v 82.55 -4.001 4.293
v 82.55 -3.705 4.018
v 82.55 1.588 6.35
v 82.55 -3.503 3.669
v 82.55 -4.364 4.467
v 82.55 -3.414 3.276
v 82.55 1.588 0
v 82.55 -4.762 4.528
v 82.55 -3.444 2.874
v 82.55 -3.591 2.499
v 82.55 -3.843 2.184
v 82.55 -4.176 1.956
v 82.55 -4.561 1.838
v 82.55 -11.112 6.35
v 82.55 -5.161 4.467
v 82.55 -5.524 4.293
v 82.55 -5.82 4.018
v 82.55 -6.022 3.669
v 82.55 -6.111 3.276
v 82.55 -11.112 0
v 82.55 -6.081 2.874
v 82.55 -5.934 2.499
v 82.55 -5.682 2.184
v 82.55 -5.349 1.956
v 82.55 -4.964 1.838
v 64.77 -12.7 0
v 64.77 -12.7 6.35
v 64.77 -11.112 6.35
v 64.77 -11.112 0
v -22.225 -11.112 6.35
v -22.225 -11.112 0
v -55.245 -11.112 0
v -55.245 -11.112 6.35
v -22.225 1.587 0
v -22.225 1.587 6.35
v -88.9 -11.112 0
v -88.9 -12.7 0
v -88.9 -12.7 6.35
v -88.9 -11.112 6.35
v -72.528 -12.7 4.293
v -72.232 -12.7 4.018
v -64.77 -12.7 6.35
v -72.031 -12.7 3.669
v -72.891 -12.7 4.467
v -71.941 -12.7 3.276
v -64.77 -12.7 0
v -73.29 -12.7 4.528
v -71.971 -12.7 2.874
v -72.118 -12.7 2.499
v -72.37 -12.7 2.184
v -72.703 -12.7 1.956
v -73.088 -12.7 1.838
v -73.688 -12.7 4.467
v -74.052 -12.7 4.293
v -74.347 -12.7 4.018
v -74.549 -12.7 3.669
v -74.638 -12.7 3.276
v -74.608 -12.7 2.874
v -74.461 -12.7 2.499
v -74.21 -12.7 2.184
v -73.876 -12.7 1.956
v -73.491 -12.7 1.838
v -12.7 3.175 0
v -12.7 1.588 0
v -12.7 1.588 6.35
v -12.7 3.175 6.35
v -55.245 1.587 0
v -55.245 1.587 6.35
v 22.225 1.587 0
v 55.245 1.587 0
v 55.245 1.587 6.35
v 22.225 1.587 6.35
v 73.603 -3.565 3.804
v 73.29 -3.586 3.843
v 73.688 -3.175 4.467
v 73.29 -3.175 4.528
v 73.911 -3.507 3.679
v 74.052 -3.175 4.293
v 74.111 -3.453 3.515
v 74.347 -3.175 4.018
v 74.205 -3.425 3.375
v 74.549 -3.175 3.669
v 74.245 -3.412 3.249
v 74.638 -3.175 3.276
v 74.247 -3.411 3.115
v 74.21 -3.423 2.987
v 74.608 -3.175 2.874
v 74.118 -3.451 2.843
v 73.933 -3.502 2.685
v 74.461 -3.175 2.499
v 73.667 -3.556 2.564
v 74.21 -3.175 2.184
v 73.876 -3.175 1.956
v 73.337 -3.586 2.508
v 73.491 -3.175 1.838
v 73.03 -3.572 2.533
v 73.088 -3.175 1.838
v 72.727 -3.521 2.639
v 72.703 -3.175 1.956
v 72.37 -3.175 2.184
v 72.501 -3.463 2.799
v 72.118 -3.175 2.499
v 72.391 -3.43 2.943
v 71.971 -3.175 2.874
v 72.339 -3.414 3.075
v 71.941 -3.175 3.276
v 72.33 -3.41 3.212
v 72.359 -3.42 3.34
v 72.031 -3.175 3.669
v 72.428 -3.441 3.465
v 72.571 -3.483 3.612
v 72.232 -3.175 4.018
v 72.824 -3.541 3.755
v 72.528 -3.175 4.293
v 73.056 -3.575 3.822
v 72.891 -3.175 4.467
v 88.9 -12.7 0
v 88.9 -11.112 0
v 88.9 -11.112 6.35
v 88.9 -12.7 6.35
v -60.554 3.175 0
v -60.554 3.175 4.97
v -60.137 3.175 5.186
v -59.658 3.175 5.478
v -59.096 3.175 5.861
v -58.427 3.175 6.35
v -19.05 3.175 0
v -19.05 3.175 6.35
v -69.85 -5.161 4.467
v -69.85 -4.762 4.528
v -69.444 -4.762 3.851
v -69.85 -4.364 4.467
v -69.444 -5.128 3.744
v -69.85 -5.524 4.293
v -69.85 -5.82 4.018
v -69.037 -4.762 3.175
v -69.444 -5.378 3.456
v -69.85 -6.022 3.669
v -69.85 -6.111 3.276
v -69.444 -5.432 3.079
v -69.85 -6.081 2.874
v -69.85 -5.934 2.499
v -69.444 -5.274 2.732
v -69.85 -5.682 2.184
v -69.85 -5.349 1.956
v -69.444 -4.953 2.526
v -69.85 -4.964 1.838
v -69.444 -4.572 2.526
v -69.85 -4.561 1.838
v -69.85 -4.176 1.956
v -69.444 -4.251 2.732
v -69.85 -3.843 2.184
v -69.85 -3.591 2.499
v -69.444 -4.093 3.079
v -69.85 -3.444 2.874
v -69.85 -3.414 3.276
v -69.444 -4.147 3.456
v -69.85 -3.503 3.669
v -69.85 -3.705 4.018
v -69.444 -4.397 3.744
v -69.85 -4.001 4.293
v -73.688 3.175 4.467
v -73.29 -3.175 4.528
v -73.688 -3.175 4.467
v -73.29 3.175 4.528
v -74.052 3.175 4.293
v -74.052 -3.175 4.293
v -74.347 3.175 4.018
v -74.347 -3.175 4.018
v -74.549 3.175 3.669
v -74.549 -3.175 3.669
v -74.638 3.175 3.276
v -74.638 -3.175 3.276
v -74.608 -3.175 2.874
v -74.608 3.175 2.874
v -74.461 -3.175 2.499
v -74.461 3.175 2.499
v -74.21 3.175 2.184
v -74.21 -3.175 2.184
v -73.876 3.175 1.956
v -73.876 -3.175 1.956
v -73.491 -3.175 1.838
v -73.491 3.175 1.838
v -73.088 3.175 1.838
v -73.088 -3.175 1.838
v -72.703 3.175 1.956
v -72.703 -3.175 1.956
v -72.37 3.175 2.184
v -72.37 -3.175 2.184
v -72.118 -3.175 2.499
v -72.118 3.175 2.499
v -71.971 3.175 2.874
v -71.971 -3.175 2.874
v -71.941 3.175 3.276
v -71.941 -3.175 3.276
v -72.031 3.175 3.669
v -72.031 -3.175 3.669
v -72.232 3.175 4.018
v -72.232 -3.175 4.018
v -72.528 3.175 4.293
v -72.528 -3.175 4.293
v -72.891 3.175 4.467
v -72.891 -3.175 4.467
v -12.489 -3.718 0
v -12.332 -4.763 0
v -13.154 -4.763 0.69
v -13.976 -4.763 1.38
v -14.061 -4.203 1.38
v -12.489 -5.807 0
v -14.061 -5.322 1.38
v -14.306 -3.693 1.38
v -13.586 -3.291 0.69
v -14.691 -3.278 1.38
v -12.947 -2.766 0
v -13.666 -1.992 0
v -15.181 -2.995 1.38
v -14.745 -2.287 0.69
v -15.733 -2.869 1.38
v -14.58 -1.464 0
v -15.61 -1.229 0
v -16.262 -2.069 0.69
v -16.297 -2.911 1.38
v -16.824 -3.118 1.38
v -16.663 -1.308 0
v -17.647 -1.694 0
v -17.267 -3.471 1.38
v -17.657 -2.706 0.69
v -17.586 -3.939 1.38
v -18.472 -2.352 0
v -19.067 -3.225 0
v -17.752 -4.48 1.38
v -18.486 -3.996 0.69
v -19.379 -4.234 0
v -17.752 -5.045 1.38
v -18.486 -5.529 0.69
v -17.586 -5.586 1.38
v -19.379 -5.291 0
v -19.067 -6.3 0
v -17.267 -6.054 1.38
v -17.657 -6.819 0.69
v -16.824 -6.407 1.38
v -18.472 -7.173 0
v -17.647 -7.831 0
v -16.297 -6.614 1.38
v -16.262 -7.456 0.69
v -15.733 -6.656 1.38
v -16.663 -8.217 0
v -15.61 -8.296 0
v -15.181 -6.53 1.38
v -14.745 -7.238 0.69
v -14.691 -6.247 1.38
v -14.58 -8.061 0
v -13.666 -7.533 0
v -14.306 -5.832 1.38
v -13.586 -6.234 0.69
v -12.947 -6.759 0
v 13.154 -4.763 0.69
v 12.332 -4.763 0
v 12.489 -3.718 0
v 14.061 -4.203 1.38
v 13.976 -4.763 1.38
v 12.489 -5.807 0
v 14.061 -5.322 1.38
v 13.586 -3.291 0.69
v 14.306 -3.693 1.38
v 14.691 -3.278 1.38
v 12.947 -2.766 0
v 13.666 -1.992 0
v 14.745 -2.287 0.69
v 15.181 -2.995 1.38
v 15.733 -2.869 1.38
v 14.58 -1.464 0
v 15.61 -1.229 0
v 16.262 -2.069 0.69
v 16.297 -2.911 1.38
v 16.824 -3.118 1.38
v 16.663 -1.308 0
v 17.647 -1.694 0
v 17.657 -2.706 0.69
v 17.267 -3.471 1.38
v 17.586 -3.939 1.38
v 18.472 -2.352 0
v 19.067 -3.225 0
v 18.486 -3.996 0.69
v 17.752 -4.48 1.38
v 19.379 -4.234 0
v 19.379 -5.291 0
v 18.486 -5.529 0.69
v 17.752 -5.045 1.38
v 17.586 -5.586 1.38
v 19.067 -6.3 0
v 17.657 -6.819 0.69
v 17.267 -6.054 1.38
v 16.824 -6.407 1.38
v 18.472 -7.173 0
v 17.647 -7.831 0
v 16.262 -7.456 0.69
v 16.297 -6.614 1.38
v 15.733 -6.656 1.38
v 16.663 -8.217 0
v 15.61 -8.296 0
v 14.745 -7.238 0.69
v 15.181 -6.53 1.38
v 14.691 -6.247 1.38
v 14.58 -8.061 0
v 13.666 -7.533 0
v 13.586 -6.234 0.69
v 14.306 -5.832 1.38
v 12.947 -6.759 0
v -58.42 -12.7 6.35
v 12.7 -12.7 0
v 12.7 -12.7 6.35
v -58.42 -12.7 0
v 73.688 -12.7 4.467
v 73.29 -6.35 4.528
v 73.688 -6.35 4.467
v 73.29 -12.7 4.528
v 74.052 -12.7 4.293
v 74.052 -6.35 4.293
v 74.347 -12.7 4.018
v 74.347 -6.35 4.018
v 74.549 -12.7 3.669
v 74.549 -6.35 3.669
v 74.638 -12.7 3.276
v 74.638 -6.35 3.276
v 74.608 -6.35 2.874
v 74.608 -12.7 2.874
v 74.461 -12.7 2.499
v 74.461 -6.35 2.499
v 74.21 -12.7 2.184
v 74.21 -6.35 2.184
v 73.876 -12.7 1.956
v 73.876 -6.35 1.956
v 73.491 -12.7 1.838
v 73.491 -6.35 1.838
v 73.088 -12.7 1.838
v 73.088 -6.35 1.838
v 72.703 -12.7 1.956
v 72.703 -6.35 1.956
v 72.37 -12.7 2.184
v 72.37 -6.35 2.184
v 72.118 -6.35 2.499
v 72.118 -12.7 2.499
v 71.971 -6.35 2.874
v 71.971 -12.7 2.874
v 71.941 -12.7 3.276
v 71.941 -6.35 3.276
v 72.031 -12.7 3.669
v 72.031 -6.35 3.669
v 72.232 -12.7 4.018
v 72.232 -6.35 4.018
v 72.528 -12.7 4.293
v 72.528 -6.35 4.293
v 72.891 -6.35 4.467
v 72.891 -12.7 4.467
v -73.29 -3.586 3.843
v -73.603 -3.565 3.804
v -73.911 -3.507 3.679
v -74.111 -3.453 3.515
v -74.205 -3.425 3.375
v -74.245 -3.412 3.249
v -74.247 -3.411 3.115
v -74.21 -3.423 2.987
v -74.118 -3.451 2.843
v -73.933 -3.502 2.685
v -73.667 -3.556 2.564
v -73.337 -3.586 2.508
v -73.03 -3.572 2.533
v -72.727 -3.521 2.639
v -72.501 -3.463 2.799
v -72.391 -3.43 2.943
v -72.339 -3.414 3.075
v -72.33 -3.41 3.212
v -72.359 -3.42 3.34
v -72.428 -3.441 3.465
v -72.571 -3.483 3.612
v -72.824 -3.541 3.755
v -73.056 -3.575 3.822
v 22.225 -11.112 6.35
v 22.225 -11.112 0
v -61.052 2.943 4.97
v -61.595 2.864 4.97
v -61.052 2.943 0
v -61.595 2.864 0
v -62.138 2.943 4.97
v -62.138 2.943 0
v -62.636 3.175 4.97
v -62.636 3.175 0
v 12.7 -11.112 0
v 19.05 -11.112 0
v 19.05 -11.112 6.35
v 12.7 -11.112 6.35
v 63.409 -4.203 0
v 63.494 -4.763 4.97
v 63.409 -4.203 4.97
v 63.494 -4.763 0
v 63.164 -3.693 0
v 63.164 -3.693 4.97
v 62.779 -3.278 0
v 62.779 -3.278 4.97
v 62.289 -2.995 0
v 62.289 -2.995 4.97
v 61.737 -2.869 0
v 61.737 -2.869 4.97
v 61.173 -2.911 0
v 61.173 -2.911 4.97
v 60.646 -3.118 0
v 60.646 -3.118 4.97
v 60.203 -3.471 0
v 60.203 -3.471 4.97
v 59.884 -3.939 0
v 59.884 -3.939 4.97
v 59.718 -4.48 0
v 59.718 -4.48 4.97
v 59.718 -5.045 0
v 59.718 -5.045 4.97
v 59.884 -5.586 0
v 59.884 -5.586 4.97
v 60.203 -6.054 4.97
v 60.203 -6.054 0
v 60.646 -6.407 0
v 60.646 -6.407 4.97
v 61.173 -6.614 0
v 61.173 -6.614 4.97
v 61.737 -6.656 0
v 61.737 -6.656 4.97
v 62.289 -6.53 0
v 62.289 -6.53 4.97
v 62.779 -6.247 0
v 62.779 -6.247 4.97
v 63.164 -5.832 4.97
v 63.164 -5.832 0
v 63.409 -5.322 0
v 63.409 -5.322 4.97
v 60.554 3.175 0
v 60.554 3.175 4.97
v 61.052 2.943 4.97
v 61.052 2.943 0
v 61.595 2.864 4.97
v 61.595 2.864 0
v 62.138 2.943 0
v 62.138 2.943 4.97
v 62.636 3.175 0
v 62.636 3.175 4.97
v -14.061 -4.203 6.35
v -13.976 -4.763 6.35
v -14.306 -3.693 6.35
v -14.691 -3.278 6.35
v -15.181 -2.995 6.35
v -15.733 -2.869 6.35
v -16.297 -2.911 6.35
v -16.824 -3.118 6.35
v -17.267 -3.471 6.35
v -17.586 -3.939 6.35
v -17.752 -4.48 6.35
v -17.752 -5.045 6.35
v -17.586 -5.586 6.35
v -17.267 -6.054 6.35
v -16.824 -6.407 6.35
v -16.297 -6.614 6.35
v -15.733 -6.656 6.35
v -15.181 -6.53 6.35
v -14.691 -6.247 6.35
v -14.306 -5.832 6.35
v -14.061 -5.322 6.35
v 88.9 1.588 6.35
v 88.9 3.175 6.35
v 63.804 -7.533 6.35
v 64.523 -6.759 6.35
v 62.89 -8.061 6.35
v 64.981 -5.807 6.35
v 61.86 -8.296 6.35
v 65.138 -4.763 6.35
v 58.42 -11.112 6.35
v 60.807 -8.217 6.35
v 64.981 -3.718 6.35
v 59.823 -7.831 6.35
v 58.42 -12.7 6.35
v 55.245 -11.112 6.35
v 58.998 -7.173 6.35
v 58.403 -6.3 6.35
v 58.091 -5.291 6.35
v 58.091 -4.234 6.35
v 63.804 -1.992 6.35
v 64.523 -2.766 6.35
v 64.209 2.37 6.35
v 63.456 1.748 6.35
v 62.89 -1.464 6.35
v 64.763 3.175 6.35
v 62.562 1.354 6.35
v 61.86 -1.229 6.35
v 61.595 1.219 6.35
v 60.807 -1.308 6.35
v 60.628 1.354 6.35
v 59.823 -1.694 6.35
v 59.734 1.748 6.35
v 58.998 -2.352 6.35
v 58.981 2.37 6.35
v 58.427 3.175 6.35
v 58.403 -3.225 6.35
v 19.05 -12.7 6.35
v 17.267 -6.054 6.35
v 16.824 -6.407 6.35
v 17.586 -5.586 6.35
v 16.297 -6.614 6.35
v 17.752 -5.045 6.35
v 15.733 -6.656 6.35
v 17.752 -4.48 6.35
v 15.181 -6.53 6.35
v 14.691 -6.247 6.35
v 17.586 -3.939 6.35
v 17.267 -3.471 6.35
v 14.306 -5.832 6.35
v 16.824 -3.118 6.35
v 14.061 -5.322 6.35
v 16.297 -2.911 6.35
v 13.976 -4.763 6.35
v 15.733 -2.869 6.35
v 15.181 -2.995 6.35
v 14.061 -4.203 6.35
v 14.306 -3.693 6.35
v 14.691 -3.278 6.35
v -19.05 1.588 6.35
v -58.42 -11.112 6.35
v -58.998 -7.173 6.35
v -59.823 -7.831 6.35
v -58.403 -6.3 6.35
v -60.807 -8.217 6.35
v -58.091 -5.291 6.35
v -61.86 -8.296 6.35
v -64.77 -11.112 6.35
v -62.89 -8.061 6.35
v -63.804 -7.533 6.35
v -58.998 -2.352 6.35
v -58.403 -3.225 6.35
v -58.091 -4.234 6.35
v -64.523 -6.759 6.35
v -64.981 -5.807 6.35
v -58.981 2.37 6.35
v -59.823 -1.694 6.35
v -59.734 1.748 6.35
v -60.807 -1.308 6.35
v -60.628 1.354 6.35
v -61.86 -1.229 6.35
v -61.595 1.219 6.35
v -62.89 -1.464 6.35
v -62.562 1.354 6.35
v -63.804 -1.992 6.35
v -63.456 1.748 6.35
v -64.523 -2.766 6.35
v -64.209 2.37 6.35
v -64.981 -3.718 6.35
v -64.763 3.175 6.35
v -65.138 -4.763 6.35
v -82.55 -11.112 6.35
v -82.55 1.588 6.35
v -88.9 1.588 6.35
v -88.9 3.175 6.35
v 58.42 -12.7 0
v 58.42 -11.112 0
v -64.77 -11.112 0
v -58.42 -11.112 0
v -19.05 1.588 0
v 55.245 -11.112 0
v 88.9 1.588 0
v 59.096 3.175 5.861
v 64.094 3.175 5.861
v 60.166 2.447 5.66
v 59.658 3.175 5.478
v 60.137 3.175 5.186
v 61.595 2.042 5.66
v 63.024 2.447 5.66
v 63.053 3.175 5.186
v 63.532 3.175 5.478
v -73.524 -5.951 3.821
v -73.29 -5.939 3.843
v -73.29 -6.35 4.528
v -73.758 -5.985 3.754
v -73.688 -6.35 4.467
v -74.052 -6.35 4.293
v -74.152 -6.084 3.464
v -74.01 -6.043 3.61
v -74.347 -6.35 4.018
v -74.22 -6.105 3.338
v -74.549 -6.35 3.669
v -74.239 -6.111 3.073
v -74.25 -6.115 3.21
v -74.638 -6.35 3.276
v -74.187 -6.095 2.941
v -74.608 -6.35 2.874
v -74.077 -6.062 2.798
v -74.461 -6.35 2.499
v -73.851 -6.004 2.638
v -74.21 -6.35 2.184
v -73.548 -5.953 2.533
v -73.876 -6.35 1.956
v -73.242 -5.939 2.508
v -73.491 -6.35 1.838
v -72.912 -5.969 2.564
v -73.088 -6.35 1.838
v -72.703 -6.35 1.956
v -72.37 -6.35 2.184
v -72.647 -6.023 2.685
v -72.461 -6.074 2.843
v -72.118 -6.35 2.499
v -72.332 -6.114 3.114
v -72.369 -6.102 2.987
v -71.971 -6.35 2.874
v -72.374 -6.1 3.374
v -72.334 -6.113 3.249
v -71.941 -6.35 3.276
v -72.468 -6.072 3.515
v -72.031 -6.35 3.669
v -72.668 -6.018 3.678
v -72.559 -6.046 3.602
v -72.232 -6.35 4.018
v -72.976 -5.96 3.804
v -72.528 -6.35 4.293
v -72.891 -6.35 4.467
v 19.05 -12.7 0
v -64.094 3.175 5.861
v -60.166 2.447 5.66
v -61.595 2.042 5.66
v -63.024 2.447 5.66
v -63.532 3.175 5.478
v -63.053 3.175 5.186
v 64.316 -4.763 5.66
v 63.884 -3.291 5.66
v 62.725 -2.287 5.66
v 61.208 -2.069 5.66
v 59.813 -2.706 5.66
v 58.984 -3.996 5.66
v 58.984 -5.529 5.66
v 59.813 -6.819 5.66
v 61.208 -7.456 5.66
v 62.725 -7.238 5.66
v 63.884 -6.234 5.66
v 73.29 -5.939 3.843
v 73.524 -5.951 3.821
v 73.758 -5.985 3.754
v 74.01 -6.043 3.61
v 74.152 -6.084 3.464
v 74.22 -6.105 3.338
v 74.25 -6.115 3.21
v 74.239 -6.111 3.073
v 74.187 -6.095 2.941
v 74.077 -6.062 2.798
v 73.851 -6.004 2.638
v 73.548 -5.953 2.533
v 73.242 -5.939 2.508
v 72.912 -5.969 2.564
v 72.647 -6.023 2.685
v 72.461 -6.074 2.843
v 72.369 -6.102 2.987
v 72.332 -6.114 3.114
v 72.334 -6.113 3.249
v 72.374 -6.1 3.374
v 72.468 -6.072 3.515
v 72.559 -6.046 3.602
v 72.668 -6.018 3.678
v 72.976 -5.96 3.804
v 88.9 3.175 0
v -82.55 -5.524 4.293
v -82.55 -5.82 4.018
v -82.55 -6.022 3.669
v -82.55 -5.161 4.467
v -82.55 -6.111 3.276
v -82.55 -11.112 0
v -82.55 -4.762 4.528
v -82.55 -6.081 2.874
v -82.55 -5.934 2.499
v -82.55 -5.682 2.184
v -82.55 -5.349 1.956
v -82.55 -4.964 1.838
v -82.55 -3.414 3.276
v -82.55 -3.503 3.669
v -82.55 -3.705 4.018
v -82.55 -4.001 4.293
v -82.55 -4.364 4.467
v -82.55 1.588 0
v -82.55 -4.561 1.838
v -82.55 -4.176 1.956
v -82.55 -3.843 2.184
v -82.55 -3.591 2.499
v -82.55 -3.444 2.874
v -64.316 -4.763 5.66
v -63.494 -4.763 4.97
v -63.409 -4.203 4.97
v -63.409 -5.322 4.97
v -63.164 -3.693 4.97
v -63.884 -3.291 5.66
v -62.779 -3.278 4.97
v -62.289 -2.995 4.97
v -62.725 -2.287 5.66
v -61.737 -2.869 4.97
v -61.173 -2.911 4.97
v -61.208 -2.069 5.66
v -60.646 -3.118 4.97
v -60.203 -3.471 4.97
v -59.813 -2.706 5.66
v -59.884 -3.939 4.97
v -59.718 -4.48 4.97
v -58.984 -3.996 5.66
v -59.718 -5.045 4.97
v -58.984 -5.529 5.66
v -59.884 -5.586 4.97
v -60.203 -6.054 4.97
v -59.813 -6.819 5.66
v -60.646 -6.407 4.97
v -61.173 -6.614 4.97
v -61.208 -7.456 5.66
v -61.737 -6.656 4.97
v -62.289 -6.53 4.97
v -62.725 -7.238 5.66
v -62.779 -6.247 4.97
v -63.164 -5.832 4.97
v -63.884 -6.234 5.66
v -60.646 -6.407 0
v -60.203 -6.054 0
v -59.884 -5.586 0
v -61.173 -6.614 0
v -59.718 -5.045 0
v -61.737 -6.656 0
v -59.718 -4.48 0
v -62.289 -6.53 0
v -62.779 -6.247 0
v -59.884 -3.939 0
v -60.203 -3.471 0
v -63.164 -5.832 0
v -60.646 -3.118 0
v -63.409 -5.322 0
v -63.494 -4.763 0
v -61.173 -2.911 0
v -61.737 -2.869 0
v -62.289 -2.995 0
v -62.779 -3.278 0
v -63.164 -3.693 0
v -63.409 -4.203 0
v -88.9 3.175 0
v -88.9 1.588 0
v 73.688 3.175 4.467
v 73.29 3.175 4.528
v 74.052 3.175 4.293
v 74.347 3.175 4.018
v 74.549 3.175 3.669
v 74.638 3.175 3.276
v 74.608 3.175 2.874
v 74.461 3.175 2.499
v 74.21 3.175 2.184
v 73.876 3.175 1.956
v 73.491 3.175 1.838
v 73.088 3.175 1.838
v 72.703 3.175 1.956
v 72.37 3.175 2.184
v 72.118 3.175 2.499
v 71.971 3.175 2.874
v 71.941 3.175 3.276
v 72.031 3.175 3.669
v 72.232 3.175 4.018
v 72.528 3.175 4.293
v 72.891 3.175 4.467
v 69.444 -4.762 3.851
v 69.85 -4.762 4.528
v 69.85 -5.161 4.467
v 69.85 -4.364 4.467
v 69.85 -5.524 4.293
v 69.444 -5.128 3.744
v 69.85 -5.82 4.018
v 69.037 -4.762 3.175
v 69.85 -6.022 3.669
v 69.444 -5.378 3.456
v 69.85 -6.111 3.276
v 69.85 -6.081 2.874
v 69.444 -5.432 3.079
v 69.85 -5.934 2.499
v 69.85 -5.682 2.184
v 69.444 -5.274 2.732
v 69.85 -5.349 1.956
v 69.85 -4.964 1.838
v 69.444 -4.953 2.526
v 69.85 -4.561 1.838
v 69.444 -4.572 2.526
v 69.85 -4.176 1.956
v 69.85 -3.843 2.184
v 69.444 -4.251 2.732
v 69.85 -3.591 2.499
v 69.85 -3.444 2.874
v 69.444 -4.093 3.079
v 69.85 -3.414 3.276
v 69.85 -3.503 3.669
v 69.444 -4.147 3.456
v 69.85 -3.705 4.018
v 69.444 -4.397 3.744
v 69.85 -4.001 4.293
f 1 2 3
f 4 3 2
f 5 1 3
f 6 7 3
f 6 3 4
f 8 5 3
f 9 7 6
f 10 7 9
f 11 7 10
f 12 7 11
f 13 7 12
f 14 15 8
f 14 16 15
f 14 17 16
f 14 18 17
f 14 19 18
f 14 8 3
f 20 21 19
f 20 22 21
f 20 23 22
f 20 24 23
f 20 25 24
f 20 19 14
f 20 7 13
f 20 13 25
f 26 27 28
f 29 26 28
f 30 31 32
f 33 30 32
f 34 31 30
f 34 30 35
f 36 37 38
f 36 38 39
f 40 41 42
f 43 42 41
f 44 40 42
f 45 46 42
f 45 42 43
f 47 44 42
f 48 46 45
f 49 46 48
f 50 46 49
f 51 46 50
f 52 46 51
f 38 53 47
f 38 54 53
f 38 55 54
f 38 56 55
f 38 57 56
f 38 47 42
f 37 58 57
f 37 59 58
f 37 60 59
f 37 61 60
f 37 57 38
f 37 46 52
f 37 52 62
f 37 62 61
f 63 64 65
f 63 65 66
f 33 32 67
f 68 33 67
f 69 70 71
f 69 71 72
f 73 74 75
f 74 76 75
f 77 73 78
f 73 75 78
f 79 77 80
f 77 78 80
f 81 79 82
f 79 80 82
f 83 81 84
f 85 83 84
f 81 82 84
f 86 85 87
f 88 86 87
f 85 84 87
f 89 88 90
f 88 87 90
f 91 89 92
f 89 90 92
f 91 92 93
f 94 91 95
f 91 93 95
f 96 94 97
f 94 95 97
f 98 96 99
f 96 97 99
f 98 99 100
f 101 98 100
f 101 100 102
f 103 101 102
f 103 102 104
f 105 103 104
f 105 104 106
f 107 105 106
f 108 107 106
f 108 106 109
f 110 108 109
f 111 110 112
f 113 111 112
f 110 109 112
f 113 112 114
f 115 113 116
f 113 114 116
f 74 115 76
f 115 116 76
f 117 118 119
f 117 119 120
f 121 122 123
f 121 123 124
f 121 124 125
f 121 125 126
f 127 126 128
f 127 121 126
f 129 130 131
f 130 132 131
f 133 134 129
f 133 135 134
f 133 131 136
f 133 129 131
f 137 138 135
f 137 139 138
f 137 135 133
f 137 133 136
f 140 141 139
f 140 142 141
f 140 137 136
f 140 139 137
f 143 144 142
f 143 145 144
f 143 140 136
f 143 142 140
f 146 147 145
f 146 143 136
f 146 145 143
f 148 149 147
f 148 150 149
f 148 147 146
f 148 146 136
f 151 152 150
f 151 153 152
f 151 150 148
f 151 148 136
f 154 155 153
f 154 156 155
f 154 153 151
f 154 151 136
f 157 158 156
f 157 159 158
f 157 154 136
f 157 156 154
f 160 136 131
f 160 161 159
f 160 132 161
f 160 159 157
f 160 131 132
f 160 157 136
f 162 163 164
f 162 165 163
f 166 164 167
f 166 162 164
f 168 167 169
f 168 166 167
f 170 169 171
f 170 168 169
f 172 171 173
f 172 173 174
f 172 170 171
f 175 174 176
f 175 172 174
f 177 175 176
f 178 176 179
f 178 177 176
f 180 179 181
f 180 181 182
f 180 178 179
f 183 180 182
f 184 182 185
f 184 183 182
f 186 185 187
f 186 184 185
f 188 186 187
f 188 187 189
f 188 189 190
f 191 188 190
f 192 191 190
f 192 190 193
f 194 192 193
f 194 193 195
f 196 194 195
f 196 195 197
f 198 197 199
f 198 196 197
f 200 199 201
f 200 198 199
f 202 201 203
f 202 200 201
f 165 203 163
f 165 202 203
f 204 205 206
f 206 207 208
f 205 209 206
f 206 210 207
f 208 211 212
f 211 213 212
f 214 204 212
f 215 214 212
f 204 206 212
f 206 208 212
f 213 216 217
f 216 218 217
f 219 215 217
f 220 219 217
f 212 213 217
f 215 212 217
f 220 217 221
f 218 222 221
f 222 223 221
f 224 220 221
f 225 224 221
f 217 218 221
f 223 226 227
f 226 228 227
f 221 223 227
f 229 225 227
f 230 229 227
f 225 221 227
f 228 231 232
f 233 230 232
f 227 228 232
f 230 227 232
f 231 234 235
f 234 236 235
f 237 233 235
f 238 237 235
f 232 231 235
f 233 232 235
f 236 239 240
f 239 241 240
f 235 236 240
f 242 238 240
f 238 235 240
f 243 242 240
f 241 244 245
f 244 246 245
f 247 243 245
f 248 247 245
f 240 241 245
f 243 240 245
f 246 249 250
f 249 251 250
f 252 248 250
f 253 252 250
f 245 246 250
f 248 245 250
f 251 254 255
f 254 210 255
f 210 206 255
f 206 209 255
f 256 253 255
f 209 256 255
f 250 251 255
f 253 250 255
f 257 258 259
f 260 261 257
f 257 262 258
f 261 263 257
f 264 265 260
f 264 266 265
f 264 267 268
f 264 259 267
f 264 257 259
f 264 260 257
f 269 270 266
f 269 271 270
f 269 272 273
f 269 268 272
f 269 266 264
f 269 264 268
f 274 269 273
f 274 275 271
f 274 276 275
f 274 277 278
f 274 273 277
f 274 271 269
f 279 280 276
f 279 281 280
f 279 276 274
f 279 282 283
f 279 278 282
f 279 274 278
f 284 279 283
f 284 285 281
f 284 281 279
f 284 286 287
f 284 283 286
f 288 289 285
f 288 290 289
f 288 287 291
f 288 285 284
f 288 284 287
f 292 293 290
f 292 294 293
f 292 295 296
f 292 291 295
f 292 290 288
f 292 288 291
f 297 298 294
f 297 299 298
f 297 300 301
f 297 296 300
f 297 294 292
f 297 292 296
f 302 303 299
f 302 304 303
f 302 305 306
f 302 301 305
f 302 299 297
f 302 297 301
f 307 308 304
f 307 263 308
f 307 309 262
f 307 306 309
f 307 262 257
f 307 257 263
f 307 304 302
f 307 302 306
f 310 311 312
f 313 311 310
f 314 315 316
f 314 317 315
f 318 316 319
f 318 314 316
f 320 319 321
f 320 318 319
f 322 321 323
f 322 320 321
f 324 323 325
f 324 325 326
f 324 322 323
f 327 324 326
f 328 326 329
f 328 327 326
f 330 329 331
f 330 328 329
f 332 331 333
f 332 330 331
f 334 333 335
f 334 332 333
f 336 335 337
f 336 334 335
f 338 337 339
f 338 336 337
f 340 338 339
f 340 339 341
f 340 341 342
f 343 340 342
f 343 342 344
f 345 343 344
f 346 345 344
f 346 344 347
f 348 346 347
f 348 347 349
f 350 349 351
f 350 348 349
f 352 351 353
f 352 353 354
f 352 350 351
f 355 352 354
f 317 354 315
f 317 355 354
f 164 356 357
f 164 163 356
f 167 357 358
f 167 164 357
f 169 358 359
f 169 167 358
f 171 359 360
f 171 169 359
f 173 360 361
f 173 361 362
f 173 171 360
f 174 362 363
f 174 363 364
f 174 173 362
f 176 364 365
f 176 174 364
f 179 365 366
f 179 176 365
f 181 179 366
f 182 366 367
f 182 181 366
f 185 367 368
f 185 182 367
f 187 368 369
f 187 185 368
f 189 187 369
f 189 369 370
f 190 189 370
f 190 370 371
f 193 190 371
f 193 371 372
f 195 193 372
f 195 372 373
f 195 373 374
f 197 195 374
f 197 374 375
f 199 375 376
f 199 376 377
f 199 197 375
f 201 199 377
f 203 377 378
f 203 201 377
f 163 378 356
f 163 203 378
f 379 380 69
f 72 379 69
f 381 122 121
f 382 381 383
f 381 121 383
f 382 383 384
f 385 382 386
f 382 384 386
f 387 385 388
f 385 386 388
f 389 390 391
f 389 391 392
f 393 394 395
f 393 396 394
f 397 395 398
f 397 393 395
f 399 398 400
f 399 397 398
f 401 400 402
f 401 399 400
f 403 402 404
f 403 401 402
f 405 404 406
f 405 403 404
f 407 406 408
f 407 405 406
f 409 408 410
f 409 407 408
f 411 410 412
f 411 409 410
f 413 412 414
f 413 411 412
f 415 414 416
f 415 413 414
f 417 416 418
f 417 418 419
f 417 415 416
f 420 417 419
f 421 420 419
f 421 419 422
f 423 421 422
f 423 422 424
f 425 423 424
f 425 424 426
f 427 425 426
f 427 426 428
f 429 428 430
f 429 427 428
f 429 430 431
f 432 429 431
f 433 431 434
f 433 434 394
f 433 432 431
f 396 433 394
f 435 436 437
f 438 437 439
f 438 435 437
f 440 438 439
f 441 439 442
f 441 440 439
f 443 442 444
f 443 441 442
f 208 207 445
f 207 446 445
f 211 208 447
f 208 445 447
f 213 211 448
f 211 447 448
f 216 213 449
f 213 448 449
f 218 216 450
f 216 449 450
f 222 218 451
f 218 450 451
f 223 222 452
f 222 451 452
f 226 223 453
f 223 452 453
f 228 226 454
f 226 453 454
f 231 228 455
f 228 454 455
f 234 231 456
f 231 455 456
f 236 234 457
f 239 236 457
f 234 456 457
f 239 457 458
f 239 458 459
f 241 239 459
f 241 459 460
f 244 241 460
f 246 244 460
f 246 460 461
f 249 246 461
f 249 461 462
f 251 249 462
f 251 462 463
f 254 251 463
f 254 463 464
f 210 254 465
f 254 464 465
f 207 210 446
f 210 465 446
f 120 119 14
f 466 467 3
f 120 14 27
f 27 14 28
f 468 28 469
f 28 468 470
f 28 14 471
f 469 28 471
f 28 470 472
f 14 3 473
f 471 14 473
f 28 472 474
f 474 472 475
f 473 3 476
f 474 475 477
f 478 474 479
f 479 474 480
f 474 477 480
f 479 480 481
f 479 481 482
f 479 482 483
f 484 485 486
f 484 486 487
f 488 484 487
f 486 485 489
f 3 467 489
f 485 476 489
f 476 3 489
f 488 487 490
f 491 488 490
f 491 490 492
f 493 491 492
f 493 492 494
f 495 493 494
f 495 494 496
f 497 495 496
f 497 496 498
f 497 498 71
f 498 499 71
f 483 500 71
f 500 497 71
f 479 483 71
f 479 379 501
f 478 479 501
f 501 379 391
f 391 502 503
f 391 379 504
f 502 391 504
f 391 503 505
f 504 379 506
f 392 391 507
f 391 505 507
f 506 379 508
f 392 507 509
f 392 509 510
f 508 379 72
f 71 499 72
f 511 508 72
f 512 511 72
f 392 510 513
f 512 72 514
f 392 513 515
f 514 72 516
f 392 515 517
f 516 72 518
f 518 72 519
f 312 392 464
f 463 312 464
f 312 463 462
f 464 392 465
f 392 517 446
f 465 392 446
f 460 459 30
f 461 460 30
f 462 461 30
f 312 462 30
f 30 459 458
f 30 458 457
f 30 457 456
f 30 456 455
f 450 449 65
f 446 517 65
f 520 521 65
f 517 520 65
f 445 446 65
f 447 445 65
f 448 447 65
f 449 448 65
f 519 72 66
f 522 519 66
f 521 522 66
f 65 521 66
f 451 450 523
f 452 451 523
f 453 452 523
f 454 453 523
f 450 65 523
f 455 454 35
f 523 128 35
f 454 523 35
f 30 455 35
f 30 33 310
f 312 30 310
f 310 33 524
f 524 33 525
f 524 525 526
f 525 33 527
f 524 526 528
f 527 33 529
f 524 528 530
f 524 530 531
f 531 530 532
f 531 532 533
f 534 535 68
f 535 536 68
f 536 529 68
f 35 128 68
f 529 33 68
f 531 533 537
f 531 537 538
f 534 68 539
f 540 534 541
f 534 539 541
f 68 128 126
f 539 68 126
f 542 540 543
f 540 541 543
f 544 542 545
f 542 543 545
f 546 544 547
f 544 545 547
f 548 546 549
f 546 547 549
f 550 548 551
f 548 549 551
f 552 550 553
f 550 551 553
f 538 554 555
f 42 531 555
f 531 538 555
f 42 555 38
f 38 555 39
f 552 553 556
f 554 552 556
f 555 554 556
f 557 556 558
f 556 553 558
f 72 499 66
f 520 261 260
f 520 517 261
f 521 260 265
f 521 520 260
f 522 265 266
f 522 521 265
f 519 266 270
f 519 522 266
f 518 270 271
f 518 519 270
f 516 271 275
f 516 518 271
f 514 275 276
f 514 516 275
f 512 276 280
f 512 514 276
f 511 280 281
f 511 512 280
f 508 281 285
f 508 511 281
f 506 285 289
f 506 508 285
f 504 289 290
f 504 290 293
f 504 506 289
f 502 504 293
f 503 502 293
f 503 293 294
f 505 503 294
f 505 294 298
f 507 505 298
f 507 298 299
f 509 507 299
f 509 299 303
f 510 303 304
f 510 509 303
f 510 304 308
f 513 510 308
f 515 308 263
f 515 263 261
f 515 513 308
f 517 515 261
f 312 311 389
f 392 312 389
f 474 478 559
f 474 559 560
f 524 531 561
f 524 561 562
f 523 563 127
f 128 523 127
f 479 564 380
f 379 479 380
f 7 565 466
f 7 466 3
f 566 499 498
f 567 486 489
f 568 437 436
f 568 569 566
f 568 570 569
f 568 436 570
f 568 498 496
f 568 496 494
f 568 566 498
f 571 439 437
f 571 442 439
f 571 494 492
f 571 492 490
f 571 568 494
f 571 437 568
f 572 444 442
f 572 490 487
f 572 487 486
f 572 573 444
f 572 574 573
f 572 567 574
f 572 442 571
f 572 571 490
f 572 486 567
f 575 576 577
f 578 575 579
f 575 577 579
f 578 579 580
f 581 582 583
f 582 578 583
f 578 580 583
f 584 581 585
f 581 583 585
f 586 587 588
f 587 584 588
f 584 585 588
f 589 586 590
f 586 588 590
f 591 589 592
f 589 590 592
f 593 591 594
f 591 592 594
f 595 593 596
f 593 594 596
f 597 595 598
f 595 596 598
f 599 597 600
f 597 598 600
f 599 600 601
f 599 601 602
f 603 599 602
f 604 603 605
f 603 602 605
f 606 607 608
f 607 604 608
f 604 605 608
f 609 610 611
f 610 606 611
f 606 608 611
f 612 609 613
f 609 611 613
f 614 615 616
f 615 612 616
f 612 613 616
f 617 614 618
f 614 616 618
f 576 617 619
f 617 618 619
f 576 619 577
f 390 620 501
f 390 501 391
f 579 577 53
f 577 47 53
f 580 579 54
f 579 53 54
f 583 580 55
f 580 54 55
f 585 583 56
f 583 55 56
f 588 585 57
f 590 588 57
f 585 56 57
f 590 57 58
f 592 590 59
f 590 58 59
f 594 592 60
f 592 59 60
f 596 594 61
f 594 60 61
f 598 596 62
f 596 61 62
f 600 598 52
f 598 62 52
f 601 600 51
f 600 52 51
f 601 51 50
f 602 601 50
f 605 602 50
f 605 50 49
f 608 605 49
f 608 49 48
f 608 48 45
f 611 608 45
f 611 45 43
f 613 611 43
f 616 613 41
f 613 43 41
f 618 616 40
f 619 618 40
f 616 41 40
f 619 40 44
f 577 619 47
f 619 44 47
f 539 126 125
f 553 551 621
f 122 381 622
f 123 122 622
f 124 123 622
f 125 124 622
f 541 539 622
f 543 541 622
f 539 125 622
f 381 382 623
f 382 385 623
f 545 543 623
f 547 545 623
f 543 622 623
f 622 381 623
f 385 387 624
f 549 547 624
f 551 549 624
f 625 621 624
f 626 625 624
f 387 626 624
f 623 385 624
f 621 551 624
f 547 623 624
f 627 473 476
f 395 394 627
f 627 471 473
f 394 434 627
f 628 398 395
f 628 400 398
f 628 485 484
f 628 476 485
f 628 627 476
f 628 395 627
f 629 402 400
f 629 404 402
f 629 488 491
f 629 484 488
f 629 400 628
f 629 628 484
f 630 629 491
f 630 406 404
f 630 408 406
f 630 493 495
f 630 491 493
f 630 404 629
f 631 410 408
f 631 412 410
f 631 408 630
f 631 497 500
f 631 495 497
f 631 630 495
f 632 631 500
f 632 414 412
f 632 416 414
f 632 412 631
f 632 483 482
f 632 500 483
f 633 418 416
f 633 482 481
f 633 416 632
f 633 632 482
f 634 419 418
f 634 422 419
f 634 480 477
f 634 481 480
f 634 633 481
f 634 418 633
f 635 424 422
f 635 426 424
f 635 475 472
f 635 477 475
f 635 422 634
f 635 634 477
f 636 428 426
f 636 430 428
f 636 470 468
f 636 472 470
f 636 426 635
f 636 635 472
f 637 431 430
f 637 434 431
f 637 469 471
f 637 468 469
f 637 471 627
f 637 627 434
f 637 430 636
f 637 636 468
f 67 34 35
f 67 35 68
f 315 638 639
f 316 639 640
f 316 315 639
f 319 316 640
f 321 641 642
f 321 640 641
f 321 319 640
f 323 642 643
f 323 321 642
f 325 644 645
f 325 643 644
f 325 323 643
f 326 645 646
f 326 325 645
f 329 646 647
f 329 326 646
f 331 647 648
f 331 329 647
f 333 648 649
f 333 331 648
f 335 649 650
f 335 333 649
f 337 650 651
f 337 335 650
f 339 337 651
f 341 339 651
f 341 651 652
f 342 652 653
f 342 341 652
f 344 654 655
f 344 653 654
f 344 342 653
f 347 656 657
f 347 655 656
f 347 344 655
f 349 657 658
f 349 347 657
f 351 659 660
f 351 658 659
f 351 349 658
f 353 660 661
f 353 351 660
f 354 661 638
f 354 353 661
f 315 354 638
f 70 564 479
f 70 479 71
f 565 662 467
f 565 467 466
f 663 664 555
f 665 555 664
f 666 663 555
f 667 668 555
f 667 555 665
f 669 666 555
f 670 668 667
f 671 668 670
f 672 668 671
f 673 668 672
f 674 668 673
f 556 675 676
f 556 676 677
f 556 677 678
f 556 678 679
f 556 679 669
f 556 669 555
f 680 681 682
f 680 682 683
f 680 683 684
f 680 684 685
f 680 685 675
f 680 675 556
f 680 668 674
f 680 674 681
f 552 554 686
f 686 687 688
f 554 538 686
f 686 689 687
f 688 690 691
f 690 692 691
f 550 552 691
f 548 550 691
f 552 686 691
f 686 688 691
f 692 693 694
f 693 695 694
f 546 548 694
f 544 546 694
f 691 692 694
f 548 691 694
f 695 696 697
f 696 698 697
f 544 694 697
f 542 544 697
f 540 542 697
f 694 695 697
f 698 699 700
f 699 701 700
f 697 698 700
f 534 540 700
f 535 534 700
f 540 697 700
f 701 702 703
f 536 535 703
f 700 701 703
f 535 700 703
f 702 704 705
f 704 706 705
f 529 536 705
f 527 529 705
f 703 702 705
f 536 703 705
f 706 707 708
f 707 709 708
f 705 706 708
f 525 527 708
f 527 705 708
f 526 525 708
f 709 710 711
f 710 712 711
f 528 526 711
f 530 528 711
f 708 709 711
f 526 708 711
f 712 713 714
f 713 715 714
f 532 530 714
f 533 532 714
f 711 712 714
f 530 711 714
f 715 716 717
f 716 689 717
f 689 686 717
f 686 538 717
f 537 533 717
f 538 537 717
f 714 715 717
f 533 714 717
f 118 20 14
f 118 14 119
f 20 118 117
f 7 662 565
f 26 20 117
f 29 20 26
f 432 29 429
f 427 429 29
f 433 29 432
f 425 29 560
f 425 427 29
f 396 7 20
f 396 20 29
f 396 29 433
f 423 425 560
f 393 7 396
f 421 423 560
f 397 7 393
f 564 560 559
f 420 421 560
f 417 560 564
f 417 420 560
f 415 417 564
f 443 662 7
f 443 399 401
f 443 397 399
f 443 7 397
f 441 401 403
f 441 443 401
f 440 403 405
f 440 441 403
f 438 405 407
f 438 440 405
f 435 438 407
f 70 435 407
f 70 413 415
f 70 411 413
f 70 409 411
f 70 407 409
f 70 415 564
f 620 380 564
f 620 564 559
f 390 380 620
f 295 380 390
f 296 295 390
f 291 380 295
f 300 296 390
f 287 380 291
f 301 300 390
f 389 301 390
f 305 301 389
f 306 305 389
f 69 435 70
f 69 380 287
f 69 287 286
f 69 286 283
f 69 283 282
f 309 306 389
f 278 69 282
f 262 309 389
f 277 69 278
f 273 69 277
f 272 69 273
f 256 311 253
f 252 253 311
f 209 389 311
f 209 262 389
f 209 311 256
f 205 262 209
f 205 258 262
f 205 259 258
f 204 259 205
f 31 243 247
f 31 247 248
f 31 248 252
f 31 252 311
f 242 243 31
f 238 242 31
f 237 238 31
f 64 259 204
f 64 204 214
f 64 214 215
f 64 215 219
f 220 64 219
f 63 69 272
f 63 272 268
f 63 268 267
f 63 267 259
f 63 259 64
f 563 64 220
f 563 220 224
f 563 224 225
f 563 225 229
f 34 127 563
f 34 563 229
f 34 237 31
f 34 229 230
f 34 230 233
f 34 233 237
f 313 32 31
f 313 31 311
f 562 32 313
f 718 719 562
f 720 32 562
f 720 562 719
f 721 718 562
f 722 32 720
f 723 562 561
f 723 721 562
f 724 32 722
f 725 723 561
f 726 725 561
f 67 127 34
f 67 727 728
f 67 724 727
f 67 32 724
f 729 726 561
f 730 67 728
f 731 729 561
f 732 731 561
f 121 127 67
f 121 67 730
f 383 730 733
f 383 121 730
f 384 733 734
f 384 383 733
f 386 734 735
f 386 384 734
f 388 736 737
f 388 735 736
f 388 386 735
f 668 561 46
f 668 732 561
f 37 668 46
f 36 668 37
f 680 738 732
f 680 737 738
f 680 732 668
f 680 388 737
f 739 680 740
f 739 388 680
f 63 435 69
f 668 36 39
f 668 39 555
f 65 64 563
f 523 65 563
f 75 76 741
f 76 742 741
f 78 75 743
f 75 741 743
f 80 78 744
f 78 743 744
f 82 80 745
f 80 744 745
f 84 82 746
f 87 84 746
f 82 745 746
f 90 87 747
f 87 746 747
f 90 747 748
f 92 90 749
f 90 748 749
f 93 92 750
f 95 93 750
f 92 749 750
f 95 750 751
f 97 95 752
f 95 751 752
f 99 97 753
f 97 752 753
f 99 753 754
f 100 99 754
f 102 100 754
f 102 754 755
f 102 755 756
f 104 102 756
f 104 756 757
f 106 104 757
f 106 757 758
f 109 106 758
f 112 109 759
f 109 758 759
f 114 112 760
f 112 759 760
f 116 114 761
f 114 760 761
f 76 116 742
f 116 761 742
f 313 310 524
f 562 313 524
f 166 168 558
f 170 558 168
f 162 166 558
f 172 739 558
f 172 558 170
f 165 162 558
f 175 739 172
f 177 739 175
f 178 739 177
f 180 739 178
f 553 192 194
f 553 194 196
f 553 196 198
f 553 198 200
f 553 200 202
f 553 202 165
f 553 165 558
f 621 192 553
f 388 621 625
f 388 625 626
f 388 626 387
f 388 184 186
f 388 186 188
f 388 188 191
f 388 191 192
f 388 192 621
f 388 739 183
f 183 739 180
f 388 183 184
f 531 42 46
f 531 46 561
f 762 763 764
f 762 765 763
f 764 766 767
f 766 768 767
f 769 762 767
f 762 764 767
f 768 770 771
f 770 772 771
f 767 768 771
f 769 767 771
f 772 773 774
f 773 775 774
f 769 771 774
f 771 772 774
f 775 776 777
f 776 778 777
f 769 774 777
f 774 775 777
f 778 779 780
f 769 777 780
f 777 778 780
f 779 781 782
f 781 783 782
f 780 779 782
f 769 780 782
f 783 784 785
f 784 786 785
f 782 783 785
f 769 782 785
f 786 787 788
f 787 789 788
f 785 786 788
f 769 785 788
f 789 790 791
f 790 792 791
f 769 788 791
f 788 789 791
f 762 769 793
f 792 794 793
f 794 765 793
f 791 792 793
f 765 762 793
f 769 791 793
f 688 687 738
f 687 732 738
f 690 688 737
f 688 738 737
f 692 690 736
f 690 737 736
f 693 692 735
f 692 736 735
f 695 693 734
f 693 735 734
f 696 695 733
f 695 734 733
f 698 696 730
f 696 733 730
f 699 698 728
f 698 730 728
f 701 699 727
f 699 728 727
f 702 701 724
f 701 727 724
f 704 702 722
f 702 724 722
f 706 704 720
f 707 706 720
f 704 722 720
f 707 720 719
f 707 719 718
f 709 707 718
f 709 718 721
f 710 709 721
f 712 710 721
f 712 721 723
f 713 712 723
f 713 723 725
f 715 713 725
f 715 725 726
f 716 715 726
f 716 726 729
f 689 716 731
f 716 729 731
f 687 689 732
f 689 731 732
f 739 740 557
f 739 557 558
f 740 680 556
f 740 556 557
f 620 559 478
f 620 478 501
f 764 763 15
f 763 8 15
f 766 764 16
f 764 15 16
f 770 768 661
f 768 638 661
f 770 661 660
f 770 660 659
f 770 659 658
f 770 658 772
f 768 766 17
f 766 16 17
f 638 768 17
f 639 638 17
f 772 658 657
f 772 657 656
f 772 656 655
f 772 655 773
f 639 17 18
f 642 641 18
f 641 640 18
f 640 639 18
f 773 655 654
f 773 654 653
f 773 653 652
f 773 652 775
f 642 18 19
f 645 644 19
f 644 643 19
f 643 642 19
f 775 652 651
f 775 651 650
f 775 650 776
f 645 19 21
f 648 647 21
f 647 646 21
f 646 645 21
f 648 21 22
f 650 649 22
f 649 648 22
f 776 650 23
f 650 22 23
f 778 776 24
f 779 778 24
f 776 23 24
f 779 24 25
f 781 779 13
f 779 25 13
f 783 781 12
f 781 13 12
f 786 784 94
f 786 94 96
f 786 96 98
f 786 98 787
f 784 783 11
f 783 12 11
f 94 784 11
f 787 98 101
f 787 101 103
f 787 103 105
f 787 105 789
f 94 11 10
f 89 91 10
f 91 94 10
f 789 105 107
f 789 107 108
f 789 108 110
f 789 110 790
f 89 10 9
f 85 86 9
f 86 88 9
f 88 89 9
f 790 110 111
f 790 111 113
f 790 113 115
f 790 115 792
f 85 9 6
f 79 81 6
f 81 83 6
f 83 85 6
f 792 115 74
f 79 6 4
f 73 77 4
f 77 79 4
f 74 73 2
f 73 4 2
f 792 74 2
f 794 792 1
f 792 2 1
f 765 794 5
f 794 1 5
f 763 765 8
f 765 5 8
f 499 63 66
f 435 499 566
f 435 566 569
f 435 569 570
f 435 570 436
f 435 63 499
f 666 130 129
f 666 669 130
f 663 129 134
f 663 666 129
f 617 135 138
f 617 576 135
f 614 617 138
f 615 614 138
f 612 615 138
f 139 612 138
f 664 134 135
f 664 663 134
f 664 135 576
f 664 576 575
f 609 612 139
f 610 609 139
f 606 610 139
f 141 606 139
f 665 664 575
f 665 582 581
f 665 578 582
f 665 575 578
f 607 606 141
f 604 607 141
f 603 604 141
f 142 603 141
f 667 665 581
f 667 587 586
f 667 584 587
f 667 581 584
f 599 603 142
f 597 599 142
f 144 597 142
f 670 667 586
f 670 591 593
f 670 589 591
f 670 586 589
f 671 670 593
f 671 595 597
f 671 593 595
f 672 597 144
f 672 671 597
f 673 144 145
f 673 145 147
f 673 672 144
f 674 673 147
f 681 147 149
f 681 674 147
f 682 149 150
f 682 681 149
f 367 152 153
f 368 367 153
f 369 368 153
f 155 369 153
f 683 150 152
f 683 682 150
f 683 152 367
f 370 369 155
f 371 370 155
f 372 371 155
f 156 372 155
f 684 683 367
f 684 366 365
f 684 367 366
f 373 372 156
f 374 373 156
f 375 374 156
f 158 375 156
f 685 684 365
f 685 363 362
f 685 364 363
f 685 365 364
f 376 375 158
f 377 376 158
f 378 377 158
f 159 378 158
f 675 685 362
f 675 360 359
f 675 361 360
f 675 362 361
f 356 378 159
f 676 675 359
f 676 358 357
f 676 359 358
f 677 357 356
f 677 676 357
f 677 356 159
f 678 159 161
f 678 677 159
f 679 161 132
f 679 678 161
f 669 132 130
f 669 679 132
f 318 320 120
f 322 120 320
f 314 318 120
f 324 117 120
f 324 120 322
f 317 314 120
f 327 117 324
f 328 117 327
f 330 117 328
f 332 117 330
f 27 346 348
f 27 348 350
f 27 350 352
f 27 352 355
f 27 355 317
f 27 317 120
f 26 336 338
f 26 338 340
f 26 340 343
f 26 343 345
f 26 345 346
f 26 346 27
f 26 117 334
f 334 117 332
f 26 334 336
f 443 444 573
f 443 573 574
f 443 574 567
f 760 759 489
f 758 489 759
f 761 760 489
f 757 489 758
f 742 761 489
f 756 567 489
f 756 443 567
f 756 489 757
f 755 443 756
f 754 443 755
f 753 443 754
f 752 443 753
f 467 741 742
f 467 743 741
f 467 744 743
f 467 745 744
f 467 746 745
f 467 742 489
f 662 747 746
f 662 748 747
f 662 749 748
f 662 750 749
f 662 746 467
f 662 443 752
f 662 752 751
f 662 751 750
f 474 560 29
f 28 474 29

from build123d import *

# Parameters (mm, degrees)
BOSS_EXTRUDE1_DEPTH                               = 6.35
SKETCH7_W                                         = 6.35
SKETCH7_H                                         = 1.5875
CUT_EXTRUDE1_DEPTH                                = 91.02678768
SKETCH10_W                                        = 6.35
SKETCH10_H                                        = 1.5875
SKETCH10_W_2                                      = 33.02
SKETCH10_H_2                                      = 12.7
CUT_EXTRUDE5_DEPTH                                = 91.02678768
CSK_FOR_6_FLAT_HEAD_MACHINE_SCREW_100_D           = 3.7973
CSK_FOR_6_FLAT_HEAD_MACHINE_SCREW_100_CSINK_D     = 7.0866
CSK_FOR_6_FLAT_HEAD_MACHINE_SCREW_100_CSINK_ANGLE = 100
CSK_FOR_6_FLAT_HEAD_MACHINE_SCREW_2_D             = 3.7973
CSK_FOR_6_FLAT_HEAD_MACHINE_SCREW_2_CSINK_D       = 7.0866
CSK_FOR_6_FLAT_HEAD_MACHINE_SCREW_2_CSINK_ANGLE   = 100


with BuildPart() as part:
    # Sketch1 → Boss-Extrude1 (new body)
    with BuildSketch(Plane.XY):
        Polygon((-88.9, 3.175), (88.9, 3.175), (88.9, 1.5875), (82.55, 1.5875), (82.55, -11.1125), (88.9, -11.1125), (88.9, -12.7), (-88.9, -12.7), (-88.9, -11.1125), (-82.55, -11.1125), (-82.55, 1.5875), (-88.9, 1.5875), align=None)
    extrude(amount=BOSS_EXTRUDE1_DEPTH)

    # Sketch4 → Tap Drill for #6-32 Tap1 (revolve, cut)
    with BuildSketch(Plane(origin=(-82.55, -4.7625, 3.175), x_dir=(0, 0, 1), z_dir=(0, 1, 0))):
        Polygon((0, 0), (0, 13.51269403), (1.35255, 12.7), (1.35255, 0), align=None)
    tap_drill_for_6_32_tap1 = revolve(axis=Axis((-88.9, -4.7625, 3.175), (1, 0, 0)), mode=Mode.SUBTRACT)

    # Mirror1: Tap Drill for #6-32 Tap1 across plane
    add(tap_drill_for_6_32_tap1.mirror(Plane(origin=(0, 0, 0), x_dir=(0, 0, 1), z_dir=(1, 0, 0))), mode=Mode.SUBTRACT)

    # Sketch5 → Tap Drill for #6-32 Tap2 (revolve, cut)
    with BuildSketch(Plane(origin=(-73.289583418, 3.175, 3.175), x_dir=(0, 0, 1), z_dir=(1, 0, 0))):
        Polygon((0, 0), (0, 7.16269403), (1.35255, 6.35), (1.35255, 0), align=None)
    tap_drill_for_6_32_tap2 = revolve(axis=Axis((-73.289583418, 9.525, 3.175), (0, -1, 0)), mode=Mode.SUBTRACT)

    # Mirror2: Tap Drill for #6-32 Tap2 across plane
    add(tap_drill_for_6_32_tap2.mirror(Plane(origin=(0, 0, 0), x_dir=(0, 0, 1), z_dir=(1, 0, 0))), mode=Mode.SUBTRACT)

    # Mirror3: Tap Drill for #6-32 Tap2 across plane
    add(tap_drill_for_6_32_tap2.mirror(Plane(origin=(0, -4.7625, 0), x_dir=(0, 0, 1), z_dir=(0, -1, 0))), mode=Mode.SUBTRACT)

    # Mirror3 copy 1 sketch → Mirror3 copy 1 (revolve, cut)
    with BuildSketch(Plane(origin=(73.289583418, -12.7, 3.175), x_dir=(0, 0, 1), z_dir=(-1, 0, 0))):
        Polygon((0, 0), (0, 7.16269403), (1.35255, 6.35), (1.35255, 0), align=None)
    revolve(axis=Axis((73.289583418, -19.05, 3.175), (0, 1, 0)), mode=Mode.SUBTRACT)

    # Sketch7 → Cut-Extrude1 (cut, through all)
    with BuildSketch(Plane.XY.offset(6.35)):
        with Locations((-61.595, 11.90625)):
            Rectangle(SKETCH7_W, SKETCH7_H)
        with Locations((-61.595, -11.90625)):
            Rectangle(SKETCH7_W, SKETCH7_H)
        with Locations((61.595, -11.90625)):
            Rectangle(SKETCH7_W, SKETCH7_H)
        with Locations((61.595, 11.90625)):
            Rectangle(SKETCH7_W, SKETCH7_H)
    extrude(amount=-CUT_EXTRUDE1_DEPTH, mode=Mode.SUBTRACT)

    # Sketch10 → Cut-Extrude5 (cut, through all)
    with BuildSketch(Plane(origin=(0, 0, 0), x_dir=(-1, 0, 0), z_dir=(0, 0, -1))):
        with Locations((-15.875, 11.90625)):
            Rectangle(SKETCH10_W, SKETCH10_H)
        with Locations((15.875, 2.38125)):
            Rectangle(SKETCH10_W, SKETCH10_H)
        with Locations((-15.875, -11.90625)):
            Rectangle(SKETCH10_W, SKETCH10_H)
        with Locations((15.875, -21.43125)):
            Rectangle(SKETCH10_W, SKETCH10_H)
        with Locations((-38.735, -4.7625)):
            Rectangle(SKETCH10_W_2, SKETCH10_H_2)
        with Locations((38.735, -4.7625)):
            Rectangle(SKETCH10_W_2, SKETCH10_H_2)
    extrude(amount=-CUT_EXTRUDE5_DEPTH, mode=Mode.SUBTRACT)

    # CSK for _6 Flat Head Machine Screw _100 (through all)
    with Locations(Plane.XY.offset(6.35)):
        with Locations((-61.595, 4.7625), (-61.595, -4.7625)):
            csk_for_6_flat_head_machine_screw_100 = CounterSinkHole(CSK_FOR_6_FLAT_HEAD_MACHINE_SCREW_100_D / 2, CSK_FOR_6_FLAT_HEAD_MACHINE_SCREW_100_CSINK_D / 2, counter_sink_angle=CSK_FOR_6_FLAT_HEAD_MACHINE_SCREW_100_CSINK_ANGLE)

    # CSK for _6 Flat Head Machine Screw _ 2 (through all)
    with Locations(Plane(origin=(0, 0, 0), x_dir=(-1, 0, 0), z_dir=(0, 0, -1))):
        with Locations((15.875, -4.7625)):
            csk_for_6_flat_head_machine_screw_2 = CounterSinkHole(CSK_FOR_6_FLAT_HEAD_MACHINE_SCREW_2_D / 2, CSK_FOR_6_FLAT_HEAD_MACHINE_SCREW_2_CSINK_D / 2, counter_sink_angle=CSK_FOR_6_FLAT_HEAD_MACHINE_SCREW_2_CSINK_ANGLE)

    # Mirror5: CSK for _6 Flat Head Machine Screw _100, CSK for _6 Flat Head Machine Screw _ 2 across plane
    add(csk_for_6_flat_head_machine_screw_100.mirror(Plane(origin=(0, 0, 0), x_dir=(0, 0, 1), z_dir=(1, 0, 0))), mode=Mode.SUBTRACT)
    add(csk_for_6_flat_head_machine_screw_2.mirror(Plane(origin=(0, 0, 0), x_dir=(0, 0, 1), z_dir=(1, 0, 0))), mode=Mode.SUBTRACT)


solid = part.part
